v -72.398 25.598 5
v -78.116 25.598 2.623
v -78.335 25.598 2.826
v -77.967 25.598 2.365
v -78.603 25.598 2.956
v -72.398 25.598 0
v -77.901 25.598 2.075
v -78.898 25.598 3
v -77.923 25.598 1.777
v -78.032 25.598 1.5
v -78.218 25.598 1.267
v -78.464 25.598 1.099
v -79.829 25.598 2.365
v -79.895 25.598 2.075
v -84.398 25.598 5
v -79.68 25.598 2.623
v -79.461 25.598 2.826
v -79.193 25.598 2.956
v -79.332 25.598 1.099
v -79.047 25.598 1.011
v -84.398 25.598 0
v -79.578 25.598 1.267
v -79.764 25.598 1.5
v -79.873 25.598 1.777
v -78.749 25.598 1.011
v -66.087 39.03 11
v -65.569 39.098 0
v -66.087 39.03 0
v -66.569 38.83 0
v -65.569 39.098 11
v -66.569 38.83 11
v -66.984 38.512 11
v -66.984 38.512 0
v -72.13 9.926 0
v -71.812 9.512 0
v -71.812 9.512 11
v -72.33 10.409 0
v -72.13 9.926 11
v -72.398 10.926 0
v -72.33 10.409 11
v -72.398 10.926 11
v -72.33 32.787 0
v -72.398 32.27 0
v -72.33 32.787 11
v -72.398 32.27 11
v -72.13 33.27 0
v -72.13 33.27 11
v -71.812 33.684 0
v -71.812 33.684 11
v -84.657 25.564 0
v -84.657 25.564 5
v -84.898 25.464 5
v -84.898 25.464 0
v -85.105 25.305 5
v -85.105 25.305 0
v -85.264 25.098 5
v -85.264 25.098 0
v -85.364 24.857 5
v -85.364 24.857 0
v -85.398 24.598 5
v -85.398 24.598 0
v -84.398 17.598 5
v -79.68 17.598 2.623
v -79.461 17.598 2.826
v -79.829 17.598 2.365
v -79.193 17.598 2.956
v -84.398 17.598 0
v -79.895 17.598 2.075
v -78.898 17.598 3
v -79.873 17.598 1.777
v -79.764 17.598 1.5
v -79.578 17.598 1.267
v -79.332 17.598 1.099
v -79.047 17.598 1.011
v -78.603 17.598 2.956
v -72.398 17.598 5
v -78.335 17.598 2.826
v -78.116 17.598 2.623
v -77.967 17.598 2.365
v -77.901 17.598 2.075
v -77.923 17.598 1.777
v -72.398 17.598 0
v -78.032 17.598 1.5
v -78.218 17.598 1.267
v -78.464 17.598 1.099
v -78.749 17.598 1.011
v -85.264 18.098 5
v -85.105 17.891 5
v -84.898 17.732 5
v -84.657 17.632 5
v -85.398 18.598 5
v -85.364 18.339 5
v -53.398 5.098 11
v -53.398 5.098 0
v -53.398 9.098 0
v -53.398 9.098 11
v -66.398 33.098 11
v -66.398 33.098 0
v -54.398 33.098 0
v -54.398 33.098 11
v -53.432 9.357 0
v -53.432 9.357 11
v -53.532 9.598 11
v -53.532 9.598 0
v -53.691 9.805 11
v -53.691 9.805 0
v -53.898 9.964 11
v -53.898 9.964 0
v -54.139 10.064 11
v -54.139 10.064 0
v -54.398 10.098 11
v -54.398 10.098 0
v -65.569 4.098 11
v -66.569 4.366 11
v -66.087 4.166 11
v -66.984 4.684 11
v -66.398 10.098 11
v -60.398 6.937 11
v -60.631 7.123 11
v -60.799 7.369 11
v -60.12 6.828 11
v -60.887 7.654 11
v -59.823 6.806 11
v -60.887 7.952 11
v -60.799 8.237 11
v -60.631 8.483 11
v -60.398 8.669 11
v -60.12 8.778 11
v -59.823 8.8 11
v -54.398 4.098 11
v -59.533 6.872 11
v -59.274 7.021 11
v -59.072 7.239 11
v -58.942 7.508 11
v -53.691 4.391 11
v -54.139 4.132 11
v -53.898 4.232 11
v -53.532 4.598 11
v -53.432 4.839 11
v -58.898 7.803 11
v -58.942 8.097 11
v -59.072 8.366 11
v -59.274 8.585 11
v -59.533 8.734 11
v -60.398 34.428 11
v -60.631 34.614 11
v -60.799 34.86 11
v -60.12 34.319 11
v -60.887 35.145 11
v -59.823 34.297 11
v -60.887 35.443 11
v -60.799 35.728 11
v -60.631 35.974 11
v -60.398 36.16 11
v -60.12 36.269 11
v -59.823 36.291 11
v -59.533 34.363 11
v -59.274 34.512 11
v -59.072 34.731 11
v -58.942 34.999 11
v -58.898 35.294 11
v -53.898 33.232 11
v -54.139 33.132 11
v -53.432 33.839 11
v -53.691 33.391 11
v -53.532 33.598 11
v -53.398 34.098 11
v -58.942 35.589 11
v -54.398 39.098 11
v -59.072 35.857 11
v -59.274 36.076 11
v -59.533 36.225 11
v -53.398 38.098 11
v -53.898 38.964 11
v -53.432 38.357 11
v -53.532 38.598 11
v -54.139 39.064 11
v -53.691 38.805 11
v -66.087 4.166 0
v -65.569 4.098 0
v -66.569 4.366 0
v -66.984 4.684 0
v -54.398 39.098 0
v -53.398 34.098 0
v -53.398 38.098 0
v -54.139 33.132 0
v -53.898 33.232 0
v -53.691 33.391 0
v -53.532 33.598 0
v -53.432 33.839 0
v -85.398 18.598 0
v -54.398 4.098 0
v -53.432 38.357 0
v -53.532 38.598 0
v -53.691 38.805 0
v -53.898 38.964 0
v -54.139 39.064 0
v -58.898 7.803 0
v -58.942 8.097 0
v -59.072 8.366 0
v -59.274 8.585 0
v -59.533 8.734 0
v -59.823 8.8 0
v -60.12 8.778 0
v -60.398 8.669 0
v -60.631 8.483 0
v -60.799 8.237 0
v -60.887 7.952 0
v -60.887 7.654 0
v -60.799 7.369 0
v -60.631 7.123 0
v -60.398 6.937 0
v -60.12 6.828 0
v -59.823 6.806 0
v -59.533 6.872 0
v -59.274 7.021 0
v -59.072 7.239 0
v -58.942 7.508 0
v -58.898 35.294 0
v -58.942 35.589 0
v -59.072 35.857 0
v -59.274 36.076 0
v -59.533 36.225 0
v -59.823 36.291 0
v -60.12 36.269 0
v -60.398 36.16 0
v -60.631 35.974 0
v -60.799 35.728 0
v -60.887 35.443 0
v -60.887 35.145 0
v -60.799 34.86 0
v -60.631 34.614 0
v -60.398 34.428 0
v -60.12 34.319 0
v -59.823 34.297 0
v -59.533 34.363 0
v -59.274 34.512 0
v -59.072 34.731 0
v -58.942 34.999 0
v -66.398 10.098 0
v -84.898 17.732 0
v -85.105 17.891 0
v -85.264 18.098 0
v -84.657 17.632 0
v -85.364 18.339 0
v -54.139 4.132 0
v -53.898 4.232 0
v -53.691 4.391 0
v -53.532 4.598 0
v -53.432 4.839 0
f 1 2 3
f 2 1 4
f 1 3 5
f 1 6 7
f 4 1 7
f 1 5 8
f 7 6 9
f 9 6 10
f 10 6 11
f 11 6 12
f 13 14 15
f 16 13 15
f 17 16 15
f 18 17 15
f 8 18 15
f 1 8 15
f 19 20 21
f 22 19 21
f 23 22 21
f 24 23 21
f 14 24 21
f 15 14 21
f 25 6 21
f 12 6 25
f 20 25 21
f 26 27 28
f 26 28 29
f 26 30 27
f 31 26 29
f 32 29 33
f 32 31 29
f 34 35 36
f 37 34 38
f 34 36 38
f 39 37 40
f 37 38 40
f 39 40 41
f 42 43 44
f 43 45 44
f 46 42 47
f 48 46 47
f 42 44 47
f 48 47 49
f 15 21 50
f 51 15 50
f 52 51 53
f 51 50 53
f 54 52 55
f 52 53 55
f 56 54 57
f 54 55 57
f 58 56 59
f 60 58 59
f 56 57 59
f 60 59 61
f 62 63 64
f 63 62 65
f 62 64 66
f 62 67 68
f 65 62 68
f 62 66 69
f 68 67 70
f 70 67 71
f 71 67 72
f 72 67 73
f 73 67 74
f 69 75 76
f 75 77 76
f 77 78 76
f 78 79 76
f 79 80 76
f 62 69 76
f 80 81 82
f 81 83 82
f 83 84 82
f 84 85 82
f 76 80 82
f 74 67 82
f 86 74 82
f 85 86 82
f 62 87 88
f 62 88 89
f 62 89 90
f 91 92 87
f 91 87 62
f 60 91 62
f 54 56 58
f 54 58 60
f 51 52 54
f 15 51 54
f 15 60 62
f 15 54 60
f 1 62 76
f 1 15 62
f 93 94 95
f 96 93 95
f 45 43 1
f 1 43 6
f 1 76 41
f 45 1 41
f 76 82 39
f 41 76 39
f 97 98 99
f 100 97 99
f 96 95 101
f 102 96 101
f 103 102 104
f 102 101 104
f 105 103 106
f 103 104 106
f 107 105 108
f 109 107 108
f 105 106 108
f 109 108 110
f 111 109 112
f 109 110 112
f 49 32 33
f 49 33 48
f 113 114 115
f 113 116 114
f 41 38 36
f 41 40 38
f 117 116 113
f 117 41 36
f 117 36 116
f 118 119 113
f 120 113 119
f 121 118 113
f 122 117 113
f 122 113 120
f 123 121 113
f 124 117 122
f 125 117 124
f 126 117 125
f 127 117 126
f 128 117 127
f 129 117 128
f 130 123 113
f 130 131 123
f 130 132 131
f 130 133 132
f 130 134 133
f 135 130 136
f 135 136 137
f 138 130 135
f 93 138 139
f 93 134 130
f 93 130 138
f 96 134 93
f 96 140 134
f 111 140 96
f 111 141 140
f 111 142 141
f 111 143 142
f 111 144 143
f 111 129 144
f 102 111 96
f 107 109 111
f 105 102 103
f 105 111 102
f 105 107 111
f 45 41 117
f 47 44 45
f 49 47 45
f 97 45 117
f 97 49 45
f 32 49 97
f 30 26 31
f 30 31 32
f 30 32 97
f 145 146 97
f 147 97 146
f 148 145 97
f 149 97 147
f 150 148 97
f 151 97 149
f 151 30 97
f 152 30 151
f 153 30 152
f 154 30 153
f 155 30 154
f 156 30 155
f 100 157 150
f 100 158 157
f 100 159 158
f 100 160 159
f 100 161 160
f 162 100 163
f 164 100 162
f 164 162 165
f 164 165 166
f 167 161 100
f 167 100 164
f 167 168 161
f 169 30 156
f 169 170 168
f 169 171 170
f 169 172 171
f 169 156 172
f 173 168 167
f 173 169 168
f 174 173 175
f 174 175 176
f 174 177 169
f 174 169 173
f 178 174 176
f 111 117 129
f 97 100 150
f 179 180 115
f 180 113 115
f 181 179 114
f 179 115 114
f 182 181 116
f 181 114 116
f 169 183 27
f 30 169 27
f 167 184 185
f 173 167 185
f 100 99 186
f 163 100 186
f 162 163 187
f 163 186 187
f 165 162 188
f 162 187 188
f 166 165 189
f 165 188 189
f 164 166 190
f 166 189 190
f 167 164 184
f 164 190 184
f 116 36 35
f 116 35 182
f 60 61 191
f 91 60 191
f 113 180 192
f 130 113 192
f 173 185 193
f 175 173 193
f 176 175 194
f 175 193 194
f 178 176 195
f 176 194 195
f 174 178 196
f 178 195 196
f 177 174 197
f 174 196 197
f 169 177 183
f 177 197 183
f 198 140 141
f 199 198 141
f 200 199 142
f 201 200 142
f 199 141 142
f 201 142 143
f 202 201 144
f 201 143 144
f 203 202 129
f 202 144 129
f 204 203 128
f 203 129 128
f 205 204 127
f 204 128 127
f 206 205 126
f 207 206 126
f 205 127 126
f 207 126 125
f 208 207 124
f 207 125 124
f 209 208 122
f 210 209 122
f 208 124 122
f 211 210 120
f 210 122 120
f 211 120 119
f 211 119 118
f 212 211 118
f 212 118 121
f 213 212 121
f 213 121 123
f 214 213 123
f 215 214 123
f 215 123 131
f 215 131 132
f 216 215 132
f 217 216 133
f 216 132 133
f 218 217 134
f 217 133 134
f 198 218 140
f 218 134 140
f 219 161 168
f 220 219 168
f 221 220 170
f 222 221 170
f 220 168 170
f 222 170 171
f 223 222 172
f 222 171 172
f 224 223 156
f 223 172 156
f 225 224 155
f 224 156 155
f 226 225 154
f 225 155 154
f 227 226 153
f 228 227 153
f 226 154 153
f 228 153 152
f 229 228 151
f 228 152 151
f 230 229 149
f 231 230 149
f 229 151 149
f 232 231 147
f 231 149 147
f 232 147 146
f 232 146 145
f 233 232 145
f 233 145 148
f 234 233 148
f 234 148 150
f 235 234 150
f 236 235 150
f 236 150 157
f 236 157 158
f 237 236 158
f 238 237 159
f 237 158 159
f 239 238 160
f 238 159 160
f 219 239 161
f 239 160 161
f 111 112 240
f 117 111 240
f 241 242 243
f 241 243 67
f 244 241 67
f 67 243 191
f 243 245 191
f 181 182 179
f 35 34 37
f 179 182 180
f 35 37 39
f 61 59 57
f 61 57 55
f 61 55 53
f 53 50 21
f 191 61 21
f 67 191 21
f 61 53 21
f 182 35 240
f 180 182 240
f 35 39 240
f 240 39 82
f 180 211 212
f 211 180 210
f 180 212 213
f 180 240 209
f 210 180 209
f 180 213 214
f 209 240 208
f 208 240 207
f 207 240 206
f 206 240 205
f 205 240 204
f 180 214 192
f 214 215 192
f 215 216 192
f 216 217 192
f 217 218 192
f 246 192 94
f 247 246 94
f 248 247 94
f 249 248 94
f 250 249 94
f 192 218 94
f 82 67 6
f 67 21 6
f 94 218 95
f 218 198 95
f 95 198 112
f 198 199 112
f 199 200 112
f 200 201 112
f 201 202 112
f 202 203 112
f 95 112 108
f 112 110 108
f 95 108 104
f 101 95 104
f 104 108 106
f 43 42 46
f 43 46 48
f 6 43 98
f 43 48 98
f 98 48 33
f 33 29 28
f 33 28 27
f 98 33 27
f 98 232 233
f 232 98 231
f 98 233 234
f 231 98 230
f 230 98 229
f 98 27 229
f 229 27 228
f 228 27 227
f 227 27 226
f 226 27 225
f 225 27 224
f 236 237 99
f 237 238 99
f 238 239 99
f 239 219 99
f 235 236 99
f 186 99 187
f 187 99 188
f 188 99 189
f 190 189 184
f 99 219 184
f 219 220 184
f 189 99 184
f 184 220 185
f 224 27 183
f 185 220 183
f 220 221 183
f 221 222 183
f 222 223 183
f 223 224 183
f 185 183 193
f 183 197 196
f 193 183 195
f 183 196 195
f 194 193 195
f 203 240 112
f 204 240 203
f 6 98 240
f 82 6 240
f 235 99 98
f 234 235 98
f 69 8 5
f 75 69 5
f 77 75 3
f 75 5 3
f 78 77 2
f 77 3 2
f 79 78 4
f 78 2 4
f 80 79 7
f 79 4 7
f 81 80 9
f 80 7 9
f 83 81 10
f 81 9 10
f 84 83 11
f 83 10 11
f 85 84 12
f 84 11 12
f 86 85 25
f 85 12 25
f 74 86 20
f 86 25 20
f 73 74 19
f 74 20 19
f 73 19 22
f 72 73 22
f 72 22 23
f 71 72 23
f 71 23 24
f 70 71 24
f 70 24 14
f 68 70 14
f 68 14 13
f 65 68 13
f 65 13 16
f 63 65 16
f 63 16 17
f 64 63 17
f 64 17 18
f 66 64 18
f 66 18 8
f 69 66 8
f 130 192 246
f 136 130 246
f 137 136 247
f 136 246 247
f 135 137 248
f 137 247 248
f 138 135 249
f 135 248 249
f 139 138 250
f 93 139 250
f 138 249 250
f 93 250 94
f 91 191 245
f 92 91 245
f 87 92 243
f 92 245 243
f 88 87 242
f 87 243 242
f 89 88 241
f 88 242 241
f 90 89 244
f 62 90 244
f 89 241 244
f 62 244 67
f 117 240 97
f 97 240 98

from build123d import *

# Parameters (mm, degrees)
BOSS_EXTRUDE1_DEPTH = 11
SKETCH6_R           = 1
CUT_EXTRUDE7_DEPTH  = 11
SKETCH7_R           = 1
CUT_EXTRUDE8_DEPTH  = 11
SKETCH8_R           = 1
CUT_EXTRUDE9_DEPTH  = 10
CUT_EXTRUDE_START   = -6
CUT_EXTRUDE_1_DEPTH = 6
FILLET_1_R          = 2


with BuildPart() as part:
    # Sketch1 → Boss-Extrude1 (new body)
    with BuildSketch(Plane.XY):
        with BuildLine():
            Line((-54.397881045, 39.097965902), (-66.397881045, 39.097965902))
            Line((-66.397881045, 39.097965902), (-72.397881045, 33.097965902))
            Line((-72.397881045, 33.097965902), (-72.397881045, 25.597965902))
            Line((-72.397881045, 25.597965902), (-84.397881045, 25.597965902))
            ThreePointArc((-84.397881045, 25.597965902), (-85.104987826, 25.305072683), (-85.397881045, 24.597965902))
            Line((-85.397881045, 24.597965902), (-85.397881045, 18.597965902))
            ThreePointArc((-85.397881045, 18.597965902), (-85.104987826, 17.890859121), (-84.397881045, 17.597965902))
            Line((-84.397881045, 17.597965902), (-72.397881045, 17.597965902))
            Line((-72.397881045, 17.597965902), (-72.397881045, 10.097965902))
            Line((-72.397881045, 10.097965902), (-66.397881045, 4.097965902))
            Line((-66.397881045, 4.097965902), (-54.397881045, 4.097965902))
            ThreePointArc((-54.397881045, 4.097965902), (-53.690774263, 4.390859121), (-53.397881045, 5.097965902))
            Line((-53.397881045, 5.097965902), (-53.397881045, 9.097965902))
            ThreePointArc((-53.397881045, 9.097965902), (-53.690774263, 9.805072683), (-54.397881045, 10.097965902))
            Line((-54.397881045, 10.097965902), (-66.397881045, 10.097965902))
            Line((-66.397881045, 10.097965902), (-66.397881045, 33.097965902))
            Line((-66.397881045, 33.097965902), (-54.397881045, 33.097965902))
            ThreePointArc((-54.397881045, 33.097965902), (-53.690774263, 33.390859121), (-53.397881045, 34.097965902))
            Line((-53.397881045, 34.097965902), (-53.397881045, 38.097965902))
            ThreePointArc((-53.397881045, 38.097965902), (-53.690774263, 38.805072683), (-54.397881045, 39.097965902))
        make_face()
    extrude(amount=BOSS_EXTRUDE1_DEPTH)

    # Sketch6 → Cut-Extrude7 (cut)
    with BuildSketch(Plane(origin=(0, -0.303980624, 11), x_dir=(1, 0, 0), z_dir=(0, 0, 1))):
        with Locations((-59.897881045, 35.597965902)):
            Circle(SKETCH6_R)
    extrude(amount=-CUT_EXTRUDE7_DEPTH, mode=Mode.SUBTRACT)

    # Sketch7 → Cut-Extrude8 (cut)
    with BuildSketch(Plane(origin=(0, 0.204760049, 11), x_dir=(1, 0, 0), z_dir=(0, 0, 1))):
        with Locations((-59.897881045, 7.597965902)):
            Circle(SKETCH7_R)
    extrude(amount=-CUT_EXTRUDE8_DEPTH, mode=Mode.SUBTRACT)

    # Sketch8 → Cut-Extrude9 (cut)
    with BuildSketch(Plane(origin=(0, 25.597965902, 0), x_dir=(1, 0, 0), z_dir=(0, 1, 0))):
        with Locations(Location((-78.897881045, -2, 0), (0, 0, 270))):
            Circle(SKETCH8_R)
    extrude(amount=-CUT_EXTRUDE9_DEPTH, mode=Mode.SUBTRACT)

    # Эскиз1 → Вырез-Вытянуть1 (cut)
    with BuildSketch(Plane.XY.offset(11).offset(CUT_EXTRUDE_START)):
        with BuildLine():
            Line((-72.397881045, 17.597965902), (-72.397881045, 25.597965902))
            Line((-72.397881045, 25.597965902), (-84.397881045, 25.597965902))
            ThreePointArc((-84.397881045, 25.597965902), (-85.104987826, 25.305072683), (-85.397881045, 24.597965902))
            Line((-85.397881045, 24.597965902), (-85.397881045, 18.597965902))
            ThreePointArc((-85.397881045, 18.597965902), (-85.104987826, 17.890859121), (-84.397881045, 17.597965902))
            Line((-84.397881045, 17.597965902), (-72.397881045, 17.597965902))
        make_face()
    extrude(amount=CUT_EXTRUDE_1_DEPTH, mode=Mode.SUBTRACT)

    # Скругление1
    fillet_1_edges = [part.edges().sort_by_distance(p)[0] for p in [
        (-72.397881045, 10.097965902, 5.5),
        (-72.397881045, 33.097965902, 5.5),
        (-66.397881045, 39.097965902, 5.5),
        (-66.397881045, 4.097965902, 5.5),
    ]]
    fillet(fillet_1_edges, radius=FILLET_1_R)


solid = part.part
